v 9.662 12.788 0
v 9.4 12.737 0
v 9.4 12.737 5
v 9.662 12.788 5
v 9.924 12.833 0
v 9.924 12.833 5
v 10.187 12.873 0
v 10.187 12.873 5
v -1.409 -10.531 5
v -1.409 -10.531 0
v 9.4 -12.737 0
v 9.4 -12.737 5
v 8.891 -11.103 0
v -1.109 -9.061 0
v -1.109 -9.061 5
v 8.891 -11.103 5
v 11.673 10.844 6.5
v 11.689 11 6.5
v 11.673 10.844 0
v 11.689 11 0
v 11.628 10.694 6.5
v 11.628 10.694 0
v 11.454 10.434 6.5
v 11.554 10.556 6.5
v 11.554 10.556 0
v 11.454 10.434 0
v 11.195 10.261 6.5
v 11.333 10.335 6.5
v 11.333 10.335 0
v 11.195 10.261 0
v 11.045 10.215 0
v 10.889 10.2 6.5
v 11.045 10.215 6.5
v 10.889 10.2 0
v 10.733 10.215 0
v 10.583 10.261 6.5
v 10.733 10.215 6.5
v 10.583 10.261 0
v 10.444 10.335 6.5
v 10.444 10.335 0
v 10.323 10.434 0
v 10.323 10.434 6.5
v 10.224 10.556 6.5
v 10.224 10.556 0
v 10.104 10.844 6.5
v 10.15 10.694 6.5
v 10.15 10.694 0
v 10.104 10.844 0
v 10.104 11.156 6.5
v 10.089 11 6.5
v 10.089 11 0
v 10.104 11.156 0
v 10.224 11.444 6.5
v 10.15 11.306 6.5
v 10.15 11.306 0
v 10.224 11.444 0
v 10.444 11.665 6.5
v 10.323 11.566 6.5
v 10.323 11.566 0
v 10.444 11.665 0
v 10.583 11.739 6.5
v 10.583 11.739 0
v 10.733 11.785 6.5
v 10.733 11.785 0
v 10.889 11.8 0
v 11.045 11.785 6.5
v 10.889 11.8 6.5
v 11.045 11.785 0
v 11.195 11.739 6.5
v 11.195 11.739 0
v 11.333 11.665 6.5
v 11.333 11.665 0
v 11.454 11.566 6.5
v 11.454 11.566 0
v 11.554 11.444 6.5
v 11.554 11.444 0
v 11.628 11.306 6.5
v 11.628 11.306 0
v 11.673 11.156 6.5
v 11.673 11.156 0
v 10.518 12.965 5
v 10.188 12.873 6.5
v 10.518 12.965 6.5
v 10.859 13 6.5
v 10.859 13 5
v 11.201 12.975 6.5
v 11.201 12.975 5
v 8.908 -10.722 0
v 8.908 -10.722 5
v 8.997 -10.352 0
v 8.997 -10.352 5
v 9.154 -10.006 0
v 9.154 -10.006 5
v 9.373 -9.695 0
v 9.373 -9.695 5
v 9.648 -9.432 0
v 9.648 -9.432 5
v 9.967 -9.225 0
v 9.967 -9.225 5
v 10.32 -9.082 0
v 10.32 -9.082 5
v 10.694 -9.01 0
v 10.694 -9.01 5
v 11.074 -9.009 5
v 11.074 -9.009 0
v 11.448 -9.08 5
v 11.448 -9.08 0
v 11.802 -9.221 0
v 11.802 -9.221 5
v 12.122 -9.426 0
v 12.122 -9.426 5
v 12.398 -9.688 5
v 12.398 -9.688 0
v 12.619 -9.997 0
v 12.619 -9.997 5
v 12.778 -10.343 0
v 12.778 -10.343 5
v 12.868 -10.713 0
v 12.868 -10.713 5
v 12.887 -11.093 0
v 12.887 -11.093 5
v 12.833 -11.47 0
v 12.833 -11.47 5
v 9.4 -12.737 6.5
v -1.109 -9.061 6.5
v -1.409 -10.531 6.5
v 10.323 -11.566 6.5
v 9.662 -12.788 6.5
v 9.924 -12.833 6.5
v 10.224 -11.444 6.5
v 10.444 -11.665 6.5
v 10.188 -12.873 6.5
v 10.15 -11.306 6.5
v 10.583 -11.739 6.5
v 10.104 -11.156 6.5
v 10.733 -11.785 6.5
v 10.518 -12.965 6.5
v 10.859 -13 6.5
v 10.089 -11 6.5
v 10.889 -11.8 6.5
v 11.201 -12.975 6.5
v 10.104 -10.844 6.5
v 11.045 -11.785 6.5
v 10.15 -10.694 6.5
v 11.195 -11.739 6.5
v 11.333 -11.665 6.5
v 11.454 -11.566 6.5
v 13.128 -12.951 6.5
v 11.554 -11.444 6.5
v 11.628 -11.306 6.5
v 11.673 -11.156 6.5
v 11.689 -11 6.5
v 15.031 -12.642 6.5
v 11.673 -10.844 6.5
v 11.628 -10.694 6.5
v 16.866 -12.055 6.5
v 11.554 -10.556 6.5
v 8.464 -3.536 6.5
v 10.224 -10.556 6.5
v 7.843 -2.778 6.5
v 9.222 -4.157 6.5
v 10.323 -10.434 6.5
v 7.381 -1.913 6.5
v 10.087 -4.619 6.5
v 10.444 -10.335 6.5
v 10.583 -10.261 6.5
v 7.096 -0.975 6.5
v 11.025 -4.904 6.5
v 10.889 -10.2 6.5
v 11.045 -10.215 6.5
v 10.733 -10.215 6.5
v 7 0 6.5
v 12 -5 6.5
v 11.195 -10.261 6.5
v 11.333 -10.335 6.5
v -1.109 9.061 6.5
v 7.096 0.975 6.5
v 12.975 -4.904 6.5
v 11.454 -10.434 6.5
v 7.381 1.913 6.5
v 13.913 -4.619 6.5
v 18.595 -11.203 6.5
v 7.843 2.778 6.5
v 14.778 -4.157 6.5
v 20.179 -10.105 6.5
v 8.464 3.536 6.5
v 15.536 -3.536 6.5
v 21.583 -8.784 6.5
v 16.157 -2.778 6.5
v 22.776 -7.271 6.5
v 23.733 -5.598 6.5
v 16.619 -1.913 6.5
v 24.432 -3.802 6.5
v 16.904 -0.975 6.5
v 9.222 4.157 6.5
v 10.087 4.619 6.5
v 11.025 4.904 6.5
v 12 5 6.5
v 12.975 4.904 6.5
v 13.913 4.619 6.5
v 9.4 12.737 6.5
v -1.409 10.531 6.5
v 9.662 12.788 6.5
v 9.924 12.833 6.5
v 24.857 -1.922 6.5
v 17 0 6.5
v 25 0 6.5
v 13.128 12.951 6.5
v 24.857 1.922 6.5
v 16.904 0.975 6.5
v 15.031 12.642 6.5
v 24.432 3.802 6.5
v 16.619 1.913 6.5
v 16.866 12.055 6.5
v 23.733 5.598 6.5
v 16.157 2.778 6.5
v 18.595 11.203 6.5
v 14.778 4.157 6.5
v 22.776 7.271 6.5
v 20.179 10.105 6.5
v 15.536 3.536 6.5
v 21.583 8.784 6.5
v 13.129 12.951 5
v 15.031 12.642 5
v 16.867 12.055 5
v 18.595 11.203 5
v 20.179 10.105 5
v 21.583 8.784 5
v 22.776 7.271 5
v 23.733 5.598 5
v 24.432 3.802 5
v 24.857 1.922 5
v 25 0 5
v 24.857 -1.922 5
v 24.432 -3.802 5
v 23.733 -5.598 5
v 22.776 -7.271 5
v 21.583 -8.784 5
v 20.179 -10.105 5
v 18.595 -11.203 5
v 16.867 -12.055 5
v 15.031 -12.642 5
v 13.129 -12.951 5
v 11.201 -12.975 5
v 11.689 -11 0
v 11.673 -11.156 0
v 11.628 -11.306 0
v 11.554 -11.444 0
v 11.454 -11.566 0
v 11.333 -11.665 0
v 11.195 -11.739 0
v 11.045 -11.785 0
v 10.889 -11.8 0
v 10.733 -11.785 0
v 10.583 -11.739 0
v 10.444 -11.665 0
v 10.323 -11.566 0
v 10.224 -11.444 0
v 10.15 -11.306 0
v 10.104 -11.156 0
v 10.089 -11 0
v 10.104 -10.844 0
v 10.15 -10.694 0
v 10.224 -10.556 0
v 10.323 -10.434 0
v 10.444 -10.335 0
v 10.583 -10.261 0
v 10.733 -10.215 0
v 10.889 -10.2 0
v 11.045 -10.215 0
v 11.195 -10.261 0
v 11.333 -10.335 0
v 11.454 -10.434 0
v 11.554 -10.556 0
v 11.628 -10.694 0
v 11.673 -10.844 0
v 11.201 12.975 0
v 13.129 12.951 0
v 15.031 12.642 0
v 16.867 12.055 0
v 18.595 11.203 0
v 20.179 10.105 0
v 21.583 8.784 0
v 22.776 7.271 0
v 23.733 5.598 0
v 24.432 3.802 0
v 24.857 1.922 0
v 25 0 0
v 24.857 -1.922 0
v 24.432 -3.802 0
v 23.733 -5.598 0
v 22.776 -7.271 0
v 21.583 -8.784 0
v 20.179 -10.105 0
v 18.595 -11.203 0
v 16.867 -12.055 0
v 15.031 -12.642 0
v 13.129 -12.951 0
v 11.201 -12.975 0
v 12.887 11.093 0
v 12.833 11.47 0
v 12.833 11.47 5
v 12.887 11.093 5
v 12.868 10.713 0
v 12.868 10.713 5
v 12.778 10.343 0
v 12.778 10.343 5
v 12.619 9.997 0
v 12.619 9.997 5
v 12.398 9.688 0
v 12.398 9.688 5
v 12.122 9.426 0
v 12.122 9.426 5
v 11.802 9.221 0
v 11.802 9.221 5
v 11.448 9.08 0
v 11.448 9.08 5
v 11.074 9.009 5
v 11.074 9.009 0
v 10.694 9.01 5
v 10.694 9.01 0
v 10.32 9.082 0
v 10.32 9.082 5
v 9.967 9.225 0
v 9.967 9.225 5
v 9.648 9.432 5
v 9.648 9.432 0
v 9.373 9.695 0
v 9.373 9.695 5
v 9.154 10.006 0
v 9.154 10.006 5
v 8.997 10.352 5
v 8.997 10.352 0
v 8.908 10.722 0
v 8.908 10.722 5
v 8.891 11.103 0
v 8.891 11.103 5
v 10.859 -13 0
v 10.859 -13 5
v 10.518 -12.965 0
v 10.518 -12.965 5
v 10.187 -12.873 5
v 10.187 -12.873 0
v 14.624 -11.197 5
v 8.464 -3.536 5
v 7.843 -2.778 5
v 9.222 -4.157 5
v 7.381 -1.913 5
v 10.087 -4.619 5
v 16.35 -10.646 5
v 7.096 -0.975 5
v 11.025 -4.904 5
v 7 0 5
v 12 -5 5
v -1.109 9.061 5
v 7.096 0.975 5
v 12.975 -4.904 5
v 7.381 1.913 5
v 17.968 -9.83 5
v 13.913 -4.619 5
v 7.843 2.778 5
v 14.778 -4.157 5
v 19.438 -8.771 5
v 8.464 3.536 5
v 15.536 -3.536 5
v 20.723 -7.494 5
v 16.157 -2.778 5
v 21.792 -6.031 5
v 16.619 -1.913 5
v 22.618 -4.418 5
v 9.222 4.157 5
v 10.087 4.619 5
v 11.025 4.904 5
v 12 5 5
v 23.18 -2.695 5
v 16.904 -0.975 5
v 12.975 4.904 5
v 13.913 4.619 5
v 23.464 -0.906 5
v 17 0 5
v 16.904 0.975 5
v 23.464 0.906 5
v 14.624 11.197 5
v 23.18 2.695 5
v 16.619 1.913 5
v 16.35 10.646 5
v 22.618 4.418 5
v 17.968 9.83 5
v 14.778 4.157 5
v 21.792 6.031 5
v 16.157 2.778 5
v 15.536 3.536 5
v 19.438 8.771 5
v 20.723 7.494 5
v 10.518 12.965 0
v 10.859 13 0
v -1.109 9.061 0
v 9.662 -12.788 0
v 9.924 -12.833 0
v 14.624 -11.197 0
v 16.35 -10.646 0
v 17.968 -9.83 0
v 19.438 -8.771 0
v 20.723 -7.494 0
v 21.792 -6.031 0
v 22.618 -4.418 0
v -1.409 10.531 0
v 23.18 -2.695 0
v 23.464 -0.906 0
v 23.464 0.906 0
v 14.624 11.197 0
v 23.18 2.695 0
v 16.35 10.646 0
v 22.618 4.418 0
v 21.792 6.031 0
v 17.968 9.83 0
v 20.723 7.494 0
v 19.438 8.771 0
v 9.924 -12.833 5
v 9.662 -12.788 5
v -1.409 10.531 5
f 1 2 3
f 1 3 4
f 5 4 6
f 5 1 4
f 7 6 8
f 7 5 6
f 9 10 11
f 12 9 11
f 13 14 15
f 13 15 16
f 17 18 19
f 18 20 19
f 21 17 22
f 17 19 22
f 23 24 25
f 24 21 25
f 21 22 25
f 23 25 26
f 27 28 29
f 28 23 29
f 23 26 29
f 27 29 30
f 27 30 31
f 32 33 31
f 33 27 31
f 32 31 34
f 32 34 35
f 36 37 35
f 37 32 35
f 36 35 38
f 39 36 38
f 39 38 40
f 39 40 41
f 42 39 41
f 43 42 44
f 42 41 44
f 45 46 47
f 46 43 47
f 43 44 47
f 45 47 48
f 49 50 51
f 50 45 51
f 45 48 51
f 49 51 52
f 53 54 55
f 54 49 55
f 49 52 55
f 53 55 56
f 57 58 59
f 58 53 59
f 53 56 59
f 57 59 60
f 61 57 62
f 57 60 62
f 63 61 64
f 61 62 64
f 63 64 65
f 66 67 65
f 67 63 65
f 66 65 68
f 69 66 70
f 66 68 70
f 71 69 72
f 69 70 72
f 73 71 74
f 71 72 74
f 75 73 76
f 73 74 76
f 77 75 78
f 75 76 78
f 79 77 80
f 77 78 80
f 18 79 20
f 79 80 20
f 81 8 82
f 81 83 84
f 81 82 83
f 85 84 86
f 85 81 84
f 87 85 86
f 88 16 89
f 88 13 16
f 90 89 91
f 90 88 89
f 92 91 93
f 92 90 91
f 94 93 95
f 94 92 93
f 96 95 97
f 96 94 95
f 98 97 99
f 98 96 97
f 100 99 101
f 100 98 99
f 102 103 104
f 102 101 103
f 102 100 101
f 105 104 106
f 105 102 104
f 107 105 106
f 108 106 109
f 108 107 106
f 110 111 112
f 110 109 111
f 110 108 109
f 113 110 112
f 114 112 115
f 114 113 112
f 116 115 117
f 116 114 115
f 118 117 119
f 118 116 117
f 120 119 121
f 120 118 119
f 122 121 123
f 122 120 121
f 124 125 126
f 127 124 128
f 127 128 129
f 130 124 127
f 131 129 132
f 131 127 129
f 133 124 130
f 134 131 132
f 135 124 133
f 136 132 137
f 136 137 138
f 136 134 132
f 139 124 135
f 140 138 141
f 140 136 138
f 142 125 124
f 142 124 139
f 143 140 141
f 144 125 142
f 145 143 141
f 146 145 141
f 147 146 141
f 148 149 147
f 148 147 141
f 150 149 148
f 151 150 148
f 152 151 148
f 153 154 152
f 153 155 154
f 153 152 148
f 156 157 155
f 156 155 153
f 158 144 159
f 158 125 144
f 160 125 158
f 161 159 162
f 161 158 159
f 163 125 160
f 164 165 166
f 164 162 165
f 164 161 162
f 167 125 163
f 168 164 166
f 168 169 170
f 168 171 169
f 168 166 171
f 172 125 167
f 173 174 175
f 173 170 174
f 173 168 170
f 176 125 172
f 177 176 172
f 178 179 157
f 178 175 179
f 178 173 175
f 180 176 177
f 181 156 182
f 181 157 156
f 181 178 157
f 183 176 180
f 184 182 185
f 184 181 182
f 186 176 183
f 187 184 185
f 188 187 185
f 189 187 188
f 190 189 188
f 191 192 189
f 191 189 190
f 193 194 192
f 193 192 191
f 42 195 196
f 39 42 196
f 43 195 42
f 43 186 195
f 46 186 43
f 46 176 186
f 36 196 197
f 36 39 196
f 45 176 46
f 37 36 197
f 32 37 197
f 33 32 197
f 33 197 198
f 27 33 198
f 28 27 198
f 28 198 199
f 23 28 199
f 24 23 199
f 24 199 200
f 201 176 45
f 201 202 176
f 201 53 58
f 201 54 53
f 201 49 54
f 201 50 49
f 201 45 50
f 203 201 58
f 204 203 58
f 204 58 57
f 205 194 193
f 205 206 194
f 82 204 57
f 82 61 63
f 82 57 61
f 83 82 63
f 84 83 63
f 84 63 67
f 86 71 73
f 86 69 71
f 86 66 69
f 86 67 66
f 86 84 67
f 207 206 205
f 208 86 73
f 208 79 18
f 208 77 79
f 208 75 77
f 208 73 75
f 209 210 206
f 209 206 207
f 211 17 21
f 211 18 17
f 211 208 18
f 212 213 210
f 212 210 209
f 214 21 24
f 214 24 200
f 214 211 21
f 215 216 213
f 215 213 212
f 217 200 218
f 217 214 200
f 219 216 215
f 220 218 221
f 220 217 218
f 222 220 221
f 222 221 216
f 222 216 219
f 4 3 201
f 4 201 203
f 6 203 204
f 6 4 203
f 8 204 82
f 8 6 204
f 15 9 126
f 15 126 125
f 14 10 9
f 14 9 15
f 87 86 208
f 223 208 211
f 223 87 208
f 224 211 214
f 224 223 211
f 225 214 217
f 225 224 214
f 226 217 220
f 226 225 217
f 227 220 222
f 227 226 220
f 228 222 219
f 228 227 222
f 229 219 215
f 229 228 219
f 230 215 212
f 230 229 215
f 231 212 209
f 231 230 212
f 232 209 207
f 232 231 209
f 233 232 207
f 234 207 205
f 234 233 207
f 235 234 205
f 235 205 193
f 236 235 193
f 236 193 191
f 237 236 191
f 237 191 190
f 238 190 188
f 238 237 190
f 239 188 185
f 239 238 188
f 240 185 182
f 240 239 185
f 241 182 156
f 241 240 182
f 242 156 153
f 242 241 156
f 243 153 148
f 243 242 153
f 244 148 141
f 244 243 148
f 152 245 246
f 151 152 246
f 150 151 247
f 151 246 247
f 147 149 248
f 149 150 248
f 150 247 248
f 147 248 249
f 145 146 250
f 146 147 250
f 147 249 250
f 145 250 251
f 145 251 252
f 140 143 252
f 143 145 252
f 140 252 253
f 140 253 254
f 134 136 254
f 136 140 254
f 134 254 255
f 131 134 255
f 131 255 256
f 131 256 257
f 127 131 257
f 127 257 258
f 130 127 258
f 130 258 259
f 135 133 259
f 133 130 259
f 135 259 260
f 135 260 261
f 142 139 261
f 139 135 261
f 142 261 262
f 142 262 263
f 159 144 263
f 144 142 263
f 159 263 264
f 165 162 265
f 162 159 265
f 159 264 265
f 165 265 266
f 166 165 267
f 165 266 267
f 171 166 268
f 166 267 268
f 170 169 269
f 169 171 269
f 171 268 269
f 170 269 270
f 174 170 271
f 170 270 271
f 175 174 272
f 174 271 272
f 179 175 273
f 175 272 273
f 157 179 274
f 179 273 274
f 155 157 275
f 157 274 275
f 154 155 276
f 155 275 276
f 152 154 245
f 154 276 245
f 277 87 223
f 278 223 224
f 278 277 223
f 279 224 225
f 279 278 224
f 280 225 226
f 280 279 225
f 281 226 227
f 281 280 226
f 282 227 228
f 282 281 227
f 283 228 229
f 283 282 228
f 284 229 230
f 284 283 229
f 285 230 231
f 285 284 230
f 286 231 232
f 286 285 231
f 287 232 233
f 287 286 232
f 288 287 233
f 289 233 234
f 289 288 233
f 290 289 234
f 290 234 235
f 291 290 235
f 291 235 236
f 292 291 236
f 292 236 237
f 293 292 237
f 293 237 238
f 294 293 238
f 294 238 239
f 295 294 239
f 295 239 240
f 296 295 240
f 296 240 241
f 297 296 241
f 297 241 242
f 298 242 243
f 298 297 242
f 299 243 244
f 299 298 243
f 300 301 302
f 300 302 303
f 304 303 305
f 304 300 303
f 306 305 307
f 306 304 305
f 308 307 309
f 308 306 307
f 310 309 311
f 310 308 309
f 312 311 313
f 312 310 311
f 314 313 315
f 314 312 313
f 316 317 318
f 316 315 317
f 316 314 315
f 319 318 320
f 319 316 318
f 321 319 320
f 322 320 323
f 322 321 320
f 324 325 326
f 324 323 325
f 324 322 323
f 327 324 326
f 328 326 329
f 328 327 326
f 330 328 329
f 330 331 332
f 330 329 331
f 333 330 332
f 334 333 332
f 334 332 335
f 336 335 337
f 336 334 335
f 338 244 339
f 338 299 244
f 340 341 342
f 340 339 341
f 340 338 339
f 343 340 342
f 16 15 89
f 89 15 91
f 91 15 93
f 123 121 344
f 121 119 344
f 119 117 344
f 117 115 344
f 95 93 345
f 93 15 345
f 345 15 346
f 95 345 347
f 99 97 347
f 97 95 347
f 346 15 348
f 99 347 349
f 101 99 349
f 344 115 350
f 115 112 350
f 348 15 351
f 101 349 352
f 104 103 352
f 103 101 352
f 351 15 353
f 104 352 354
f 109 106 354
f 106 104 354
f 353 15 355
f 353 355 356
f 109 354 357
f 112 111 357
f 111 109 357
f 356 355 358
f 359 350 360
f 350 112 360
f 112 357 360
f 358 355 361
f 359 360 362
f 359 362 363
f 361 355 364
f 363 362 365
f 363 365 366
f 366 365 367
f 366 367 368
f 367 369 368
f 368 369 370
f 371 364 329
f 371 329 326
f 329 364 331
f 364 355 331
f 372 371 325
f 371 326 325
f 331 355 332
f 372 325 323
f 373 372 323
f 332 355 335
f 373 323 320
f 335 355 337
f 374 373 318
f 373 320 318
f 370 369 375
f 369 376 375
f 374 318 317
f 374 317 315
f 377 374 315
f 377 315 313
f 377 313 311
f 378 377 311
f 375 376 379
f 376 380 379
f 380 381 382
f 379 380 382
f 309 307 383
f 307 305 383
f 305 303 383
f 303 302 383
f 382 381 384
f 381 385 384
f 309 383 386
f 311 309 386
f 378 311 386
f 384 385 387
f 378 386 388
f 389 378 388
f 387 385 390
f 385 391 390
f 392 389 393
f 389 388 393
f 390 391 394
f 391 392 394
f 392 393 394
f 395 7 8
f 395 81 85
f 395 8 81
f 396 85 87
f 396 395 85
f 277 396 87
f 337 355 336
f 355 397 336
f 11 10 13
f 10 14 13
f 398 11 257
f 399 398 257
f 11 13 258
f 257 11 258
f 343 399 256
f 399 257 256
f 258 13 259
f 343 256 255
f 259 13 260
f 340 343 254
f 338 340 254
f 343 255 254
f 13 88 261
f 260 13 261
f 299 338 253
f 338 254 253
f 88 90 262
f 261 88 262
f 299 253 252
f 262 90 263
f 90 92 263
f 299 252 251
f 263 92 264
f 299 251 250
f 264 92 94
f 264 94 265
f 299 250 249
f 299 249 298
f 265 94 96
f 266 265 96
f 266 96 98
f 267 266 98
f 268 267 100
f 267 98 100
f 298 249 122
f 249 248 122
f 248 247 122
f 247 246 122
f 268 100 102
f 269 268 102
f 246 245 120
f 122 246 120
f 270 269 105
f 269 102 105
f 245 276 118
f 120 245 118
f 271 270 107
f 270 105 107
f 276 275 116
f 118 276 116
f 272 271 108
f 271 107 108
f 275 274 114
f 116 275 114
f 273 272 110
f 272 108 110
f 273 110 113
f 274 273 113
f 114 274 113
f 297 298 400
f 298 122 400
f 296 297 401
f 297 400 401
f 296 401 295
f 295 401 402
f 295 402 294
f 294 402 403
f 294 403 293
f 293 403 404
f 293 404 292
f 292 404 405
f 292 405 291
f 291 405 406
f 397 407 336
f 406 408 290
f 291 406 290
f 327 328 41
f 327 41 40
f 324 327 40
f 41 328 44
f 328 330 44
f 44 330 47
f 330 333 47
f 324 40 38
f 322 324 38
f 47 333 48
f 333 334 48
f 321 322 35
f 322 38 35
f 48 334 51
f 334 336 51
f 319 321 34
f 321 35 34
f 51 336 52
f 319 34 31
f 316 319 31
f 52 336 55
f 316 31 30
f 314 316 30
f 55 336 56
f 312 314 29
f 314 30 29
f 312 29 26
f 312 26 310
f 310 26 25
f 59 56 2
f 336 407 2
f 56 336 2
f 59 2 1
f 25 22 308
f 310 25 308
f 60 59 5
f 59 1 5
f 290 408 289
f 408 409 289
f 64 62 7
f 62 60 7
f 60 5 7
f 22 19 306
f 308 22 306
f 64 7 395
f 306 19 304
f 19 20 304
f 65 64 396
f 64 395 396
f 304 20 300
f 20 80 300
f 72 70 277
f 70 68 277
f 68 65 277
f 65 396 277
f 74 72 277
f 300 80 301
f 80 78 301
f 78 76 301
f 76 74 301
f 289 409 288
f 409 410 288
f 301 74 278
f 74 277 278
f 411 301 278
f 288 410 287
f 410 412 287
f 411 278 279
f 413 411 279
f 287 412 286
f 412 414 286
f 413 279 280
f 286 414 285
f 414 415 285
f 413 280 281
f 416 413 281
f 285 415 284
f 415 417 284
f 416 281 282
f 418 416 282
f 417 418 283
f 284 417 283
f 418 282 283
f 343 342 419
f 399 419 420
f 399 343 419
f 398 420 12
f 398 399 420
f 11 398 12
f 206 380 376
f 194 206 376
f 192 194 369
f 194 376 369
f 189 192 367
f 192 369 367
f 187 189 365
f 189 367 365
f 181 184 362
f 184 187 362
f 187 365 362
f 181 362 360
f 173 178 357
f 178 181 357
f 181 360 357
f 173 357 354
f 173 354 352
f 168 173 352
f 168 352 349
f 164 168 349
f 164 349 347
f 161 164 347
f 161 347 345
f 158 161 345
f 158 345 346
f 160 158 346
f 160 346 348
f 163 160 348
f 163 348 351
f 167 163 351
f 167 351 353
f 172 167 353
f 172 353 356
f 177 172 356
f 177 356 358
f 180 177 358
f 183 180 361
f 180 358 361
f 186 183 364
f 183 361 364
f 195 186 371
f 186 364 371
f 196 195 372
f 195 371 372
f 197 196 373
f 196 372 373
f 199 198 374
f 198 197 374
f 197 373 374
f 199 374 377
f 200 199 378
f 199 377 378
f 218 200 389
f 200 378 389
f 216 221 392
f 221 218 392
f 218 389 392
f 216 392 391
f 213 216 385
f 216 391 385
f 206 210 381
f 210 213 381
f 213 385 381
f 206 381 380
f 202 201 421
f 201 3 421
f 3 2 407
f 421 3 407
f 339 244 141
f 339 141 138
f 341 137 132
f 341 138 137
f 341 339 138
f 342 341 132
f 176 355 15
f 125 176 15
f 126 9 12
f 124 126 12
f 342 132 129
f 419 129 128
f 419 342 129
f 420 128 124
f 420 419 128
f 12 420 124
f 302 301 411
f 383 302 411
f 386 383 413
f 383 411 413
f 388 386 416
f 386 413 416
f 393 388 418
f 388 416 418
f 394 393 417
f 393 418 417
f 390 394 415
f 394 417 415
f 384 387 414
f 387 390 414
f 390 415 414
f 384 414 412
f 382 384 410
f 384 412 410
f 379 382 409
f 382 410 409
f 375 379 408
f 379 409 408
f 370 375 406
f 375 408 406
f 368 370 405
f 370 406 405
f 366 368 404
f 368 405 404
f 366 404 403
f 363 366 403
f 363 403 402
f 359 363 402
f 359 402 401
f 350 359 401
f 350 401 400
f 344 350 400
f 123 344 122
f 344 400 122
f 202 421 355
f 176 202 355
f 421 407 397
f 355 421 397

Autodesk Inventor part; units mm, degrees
ref_plane "YZ Plane" through (0, 0, 0) normal (1, 0, 0) x (0, 1, 0)
ref_plane "XZ Plane" through (0, 0, 0) normal (0, 1, 0) x (-1, 0, 0)
ref_plane "XY Plane" through (0, 0, 0) normal (0, 0, 1) x (1, 0, 0)
ref_plane "作業平面1" through (0, 0, 0) normal (0, 0, 1) x (1, 0, 0)
sketch "スケッチ1" plane through (0, 0, 0) normal (0, 0, 1) x (1, 0, 0)
  arc A0 (9.4, -12.7373) -> (9.4, 12.7373) centre (12, 0) ccw projected
  circle A1 centre (10.8888, 11) radius 0.8 projected
  circle A2 centre (10.8888, -11) radius 0.8 projected
  circle A3 centre (10.8888, 11) radius 2
  circle A4 centre (10.8888, -11) radius 2
  arc A5 (12.8328, -11.4698) -> (12.8328, 11.4698) centre (12, 0) ccw
  line L0 (9.4, 12.7373) -> (-19.4, 6.8586) projected
  line L1 (-19.4, -6.8586) -> (9.4, -12.7373) projected
  line L2 (-1.4086, 10.5311) -> (-1.1086, 9.0614)
  line L3 (-1.1086, 9.0614) -> (8.8914, 11.1026)
  line L4 (-1.4086, -10.5311) -> (-1.1086, -9.0614)
  line L5 (-1.1086, -9.0614) -> (8.8914, -11.1026)
  point P0 (0, 0)
  point P1 (10.1875, -12.873)
  point P2 (11.2013, -12.9754)
  point P3 (11.2013, 12.9754)
  point P4 (10.1875, 12.873)
  dimension "d0" = 4
  dimension "d1" = 1.5
  dimension "d2" = 1.5
  dimension "d3" = 10
extrude "押し出し1" add sketch "スケッチ1" along normal blind 5
sketch "スケッチ2" plane through (0, 0, 5) normal (0, 0, 1) x (1, 0, 0)
  arc A0 (8.8914, 11.1026) -> (12.8328, 11.4698) centre (10.8888, 11) ccw projected
  arc A1 (12.8328, -11.4698) -> (12.8328, 11.4698) centre (12, 0) ccw projected
  arc A2 (12.8328, -11.4698) -> (8.8914, -11.1026) centre (10.8888, -11) ccw projected
  line L0 (8.8914, -11.1026) -> (-1.1086, -9.0614) projected
  line L1 (-1.1086, -9.0614) -> (-1.4086, -10.5311) projected
  line L2 (-1.4086, -10.5311) -> (9.4, -12.7373) projected
  arc A3 (9.4, -12.7373) -> (10.1875, -12.873) centre (12, 0) ccw projected
  arc A4 (10.1875, -12.873) -> (11.2013, -12.9754) centre (10.8888, -11) ccw projected
  arc A5 (11.2013, -12.9754) -> (11.2013, 12.9754) centre (12, 0) ccw projected
  arc A6 (11.2013, 12.9754) -> (10.1875, 12.873) centre (10.8888, 11) ccw projected
  arc A7 (10.1875, 12.873) -> (9.4, 12.7373) centre (12, 0) ccw projected
  line L3 (9.4, 12.7373) -> (-1.4086, 10.5311) projected
  line L4 (-1.4086, 10.5311) -> (-1.1086, 9.0614) projected
  line L5 (-1.1086, 9.0614) -> (8.8914, 11.1026) projected
  circle A8 centre (10.8888, -11) radius 0.8 projected
  circle A9 centre (10.8888, 11) radius 0.8 projected
  line L6 (-1.1086, 9.0614) -> (-1.1086, -9.0614)
  circle A10 centre (12, 0) radius 5
  point P0 (0, 0)
  dimension "d6" = 10
extrude "押し出し2" add sketch "スケッチ2" along normal blind 1.5
properties part number "MotorCover"
